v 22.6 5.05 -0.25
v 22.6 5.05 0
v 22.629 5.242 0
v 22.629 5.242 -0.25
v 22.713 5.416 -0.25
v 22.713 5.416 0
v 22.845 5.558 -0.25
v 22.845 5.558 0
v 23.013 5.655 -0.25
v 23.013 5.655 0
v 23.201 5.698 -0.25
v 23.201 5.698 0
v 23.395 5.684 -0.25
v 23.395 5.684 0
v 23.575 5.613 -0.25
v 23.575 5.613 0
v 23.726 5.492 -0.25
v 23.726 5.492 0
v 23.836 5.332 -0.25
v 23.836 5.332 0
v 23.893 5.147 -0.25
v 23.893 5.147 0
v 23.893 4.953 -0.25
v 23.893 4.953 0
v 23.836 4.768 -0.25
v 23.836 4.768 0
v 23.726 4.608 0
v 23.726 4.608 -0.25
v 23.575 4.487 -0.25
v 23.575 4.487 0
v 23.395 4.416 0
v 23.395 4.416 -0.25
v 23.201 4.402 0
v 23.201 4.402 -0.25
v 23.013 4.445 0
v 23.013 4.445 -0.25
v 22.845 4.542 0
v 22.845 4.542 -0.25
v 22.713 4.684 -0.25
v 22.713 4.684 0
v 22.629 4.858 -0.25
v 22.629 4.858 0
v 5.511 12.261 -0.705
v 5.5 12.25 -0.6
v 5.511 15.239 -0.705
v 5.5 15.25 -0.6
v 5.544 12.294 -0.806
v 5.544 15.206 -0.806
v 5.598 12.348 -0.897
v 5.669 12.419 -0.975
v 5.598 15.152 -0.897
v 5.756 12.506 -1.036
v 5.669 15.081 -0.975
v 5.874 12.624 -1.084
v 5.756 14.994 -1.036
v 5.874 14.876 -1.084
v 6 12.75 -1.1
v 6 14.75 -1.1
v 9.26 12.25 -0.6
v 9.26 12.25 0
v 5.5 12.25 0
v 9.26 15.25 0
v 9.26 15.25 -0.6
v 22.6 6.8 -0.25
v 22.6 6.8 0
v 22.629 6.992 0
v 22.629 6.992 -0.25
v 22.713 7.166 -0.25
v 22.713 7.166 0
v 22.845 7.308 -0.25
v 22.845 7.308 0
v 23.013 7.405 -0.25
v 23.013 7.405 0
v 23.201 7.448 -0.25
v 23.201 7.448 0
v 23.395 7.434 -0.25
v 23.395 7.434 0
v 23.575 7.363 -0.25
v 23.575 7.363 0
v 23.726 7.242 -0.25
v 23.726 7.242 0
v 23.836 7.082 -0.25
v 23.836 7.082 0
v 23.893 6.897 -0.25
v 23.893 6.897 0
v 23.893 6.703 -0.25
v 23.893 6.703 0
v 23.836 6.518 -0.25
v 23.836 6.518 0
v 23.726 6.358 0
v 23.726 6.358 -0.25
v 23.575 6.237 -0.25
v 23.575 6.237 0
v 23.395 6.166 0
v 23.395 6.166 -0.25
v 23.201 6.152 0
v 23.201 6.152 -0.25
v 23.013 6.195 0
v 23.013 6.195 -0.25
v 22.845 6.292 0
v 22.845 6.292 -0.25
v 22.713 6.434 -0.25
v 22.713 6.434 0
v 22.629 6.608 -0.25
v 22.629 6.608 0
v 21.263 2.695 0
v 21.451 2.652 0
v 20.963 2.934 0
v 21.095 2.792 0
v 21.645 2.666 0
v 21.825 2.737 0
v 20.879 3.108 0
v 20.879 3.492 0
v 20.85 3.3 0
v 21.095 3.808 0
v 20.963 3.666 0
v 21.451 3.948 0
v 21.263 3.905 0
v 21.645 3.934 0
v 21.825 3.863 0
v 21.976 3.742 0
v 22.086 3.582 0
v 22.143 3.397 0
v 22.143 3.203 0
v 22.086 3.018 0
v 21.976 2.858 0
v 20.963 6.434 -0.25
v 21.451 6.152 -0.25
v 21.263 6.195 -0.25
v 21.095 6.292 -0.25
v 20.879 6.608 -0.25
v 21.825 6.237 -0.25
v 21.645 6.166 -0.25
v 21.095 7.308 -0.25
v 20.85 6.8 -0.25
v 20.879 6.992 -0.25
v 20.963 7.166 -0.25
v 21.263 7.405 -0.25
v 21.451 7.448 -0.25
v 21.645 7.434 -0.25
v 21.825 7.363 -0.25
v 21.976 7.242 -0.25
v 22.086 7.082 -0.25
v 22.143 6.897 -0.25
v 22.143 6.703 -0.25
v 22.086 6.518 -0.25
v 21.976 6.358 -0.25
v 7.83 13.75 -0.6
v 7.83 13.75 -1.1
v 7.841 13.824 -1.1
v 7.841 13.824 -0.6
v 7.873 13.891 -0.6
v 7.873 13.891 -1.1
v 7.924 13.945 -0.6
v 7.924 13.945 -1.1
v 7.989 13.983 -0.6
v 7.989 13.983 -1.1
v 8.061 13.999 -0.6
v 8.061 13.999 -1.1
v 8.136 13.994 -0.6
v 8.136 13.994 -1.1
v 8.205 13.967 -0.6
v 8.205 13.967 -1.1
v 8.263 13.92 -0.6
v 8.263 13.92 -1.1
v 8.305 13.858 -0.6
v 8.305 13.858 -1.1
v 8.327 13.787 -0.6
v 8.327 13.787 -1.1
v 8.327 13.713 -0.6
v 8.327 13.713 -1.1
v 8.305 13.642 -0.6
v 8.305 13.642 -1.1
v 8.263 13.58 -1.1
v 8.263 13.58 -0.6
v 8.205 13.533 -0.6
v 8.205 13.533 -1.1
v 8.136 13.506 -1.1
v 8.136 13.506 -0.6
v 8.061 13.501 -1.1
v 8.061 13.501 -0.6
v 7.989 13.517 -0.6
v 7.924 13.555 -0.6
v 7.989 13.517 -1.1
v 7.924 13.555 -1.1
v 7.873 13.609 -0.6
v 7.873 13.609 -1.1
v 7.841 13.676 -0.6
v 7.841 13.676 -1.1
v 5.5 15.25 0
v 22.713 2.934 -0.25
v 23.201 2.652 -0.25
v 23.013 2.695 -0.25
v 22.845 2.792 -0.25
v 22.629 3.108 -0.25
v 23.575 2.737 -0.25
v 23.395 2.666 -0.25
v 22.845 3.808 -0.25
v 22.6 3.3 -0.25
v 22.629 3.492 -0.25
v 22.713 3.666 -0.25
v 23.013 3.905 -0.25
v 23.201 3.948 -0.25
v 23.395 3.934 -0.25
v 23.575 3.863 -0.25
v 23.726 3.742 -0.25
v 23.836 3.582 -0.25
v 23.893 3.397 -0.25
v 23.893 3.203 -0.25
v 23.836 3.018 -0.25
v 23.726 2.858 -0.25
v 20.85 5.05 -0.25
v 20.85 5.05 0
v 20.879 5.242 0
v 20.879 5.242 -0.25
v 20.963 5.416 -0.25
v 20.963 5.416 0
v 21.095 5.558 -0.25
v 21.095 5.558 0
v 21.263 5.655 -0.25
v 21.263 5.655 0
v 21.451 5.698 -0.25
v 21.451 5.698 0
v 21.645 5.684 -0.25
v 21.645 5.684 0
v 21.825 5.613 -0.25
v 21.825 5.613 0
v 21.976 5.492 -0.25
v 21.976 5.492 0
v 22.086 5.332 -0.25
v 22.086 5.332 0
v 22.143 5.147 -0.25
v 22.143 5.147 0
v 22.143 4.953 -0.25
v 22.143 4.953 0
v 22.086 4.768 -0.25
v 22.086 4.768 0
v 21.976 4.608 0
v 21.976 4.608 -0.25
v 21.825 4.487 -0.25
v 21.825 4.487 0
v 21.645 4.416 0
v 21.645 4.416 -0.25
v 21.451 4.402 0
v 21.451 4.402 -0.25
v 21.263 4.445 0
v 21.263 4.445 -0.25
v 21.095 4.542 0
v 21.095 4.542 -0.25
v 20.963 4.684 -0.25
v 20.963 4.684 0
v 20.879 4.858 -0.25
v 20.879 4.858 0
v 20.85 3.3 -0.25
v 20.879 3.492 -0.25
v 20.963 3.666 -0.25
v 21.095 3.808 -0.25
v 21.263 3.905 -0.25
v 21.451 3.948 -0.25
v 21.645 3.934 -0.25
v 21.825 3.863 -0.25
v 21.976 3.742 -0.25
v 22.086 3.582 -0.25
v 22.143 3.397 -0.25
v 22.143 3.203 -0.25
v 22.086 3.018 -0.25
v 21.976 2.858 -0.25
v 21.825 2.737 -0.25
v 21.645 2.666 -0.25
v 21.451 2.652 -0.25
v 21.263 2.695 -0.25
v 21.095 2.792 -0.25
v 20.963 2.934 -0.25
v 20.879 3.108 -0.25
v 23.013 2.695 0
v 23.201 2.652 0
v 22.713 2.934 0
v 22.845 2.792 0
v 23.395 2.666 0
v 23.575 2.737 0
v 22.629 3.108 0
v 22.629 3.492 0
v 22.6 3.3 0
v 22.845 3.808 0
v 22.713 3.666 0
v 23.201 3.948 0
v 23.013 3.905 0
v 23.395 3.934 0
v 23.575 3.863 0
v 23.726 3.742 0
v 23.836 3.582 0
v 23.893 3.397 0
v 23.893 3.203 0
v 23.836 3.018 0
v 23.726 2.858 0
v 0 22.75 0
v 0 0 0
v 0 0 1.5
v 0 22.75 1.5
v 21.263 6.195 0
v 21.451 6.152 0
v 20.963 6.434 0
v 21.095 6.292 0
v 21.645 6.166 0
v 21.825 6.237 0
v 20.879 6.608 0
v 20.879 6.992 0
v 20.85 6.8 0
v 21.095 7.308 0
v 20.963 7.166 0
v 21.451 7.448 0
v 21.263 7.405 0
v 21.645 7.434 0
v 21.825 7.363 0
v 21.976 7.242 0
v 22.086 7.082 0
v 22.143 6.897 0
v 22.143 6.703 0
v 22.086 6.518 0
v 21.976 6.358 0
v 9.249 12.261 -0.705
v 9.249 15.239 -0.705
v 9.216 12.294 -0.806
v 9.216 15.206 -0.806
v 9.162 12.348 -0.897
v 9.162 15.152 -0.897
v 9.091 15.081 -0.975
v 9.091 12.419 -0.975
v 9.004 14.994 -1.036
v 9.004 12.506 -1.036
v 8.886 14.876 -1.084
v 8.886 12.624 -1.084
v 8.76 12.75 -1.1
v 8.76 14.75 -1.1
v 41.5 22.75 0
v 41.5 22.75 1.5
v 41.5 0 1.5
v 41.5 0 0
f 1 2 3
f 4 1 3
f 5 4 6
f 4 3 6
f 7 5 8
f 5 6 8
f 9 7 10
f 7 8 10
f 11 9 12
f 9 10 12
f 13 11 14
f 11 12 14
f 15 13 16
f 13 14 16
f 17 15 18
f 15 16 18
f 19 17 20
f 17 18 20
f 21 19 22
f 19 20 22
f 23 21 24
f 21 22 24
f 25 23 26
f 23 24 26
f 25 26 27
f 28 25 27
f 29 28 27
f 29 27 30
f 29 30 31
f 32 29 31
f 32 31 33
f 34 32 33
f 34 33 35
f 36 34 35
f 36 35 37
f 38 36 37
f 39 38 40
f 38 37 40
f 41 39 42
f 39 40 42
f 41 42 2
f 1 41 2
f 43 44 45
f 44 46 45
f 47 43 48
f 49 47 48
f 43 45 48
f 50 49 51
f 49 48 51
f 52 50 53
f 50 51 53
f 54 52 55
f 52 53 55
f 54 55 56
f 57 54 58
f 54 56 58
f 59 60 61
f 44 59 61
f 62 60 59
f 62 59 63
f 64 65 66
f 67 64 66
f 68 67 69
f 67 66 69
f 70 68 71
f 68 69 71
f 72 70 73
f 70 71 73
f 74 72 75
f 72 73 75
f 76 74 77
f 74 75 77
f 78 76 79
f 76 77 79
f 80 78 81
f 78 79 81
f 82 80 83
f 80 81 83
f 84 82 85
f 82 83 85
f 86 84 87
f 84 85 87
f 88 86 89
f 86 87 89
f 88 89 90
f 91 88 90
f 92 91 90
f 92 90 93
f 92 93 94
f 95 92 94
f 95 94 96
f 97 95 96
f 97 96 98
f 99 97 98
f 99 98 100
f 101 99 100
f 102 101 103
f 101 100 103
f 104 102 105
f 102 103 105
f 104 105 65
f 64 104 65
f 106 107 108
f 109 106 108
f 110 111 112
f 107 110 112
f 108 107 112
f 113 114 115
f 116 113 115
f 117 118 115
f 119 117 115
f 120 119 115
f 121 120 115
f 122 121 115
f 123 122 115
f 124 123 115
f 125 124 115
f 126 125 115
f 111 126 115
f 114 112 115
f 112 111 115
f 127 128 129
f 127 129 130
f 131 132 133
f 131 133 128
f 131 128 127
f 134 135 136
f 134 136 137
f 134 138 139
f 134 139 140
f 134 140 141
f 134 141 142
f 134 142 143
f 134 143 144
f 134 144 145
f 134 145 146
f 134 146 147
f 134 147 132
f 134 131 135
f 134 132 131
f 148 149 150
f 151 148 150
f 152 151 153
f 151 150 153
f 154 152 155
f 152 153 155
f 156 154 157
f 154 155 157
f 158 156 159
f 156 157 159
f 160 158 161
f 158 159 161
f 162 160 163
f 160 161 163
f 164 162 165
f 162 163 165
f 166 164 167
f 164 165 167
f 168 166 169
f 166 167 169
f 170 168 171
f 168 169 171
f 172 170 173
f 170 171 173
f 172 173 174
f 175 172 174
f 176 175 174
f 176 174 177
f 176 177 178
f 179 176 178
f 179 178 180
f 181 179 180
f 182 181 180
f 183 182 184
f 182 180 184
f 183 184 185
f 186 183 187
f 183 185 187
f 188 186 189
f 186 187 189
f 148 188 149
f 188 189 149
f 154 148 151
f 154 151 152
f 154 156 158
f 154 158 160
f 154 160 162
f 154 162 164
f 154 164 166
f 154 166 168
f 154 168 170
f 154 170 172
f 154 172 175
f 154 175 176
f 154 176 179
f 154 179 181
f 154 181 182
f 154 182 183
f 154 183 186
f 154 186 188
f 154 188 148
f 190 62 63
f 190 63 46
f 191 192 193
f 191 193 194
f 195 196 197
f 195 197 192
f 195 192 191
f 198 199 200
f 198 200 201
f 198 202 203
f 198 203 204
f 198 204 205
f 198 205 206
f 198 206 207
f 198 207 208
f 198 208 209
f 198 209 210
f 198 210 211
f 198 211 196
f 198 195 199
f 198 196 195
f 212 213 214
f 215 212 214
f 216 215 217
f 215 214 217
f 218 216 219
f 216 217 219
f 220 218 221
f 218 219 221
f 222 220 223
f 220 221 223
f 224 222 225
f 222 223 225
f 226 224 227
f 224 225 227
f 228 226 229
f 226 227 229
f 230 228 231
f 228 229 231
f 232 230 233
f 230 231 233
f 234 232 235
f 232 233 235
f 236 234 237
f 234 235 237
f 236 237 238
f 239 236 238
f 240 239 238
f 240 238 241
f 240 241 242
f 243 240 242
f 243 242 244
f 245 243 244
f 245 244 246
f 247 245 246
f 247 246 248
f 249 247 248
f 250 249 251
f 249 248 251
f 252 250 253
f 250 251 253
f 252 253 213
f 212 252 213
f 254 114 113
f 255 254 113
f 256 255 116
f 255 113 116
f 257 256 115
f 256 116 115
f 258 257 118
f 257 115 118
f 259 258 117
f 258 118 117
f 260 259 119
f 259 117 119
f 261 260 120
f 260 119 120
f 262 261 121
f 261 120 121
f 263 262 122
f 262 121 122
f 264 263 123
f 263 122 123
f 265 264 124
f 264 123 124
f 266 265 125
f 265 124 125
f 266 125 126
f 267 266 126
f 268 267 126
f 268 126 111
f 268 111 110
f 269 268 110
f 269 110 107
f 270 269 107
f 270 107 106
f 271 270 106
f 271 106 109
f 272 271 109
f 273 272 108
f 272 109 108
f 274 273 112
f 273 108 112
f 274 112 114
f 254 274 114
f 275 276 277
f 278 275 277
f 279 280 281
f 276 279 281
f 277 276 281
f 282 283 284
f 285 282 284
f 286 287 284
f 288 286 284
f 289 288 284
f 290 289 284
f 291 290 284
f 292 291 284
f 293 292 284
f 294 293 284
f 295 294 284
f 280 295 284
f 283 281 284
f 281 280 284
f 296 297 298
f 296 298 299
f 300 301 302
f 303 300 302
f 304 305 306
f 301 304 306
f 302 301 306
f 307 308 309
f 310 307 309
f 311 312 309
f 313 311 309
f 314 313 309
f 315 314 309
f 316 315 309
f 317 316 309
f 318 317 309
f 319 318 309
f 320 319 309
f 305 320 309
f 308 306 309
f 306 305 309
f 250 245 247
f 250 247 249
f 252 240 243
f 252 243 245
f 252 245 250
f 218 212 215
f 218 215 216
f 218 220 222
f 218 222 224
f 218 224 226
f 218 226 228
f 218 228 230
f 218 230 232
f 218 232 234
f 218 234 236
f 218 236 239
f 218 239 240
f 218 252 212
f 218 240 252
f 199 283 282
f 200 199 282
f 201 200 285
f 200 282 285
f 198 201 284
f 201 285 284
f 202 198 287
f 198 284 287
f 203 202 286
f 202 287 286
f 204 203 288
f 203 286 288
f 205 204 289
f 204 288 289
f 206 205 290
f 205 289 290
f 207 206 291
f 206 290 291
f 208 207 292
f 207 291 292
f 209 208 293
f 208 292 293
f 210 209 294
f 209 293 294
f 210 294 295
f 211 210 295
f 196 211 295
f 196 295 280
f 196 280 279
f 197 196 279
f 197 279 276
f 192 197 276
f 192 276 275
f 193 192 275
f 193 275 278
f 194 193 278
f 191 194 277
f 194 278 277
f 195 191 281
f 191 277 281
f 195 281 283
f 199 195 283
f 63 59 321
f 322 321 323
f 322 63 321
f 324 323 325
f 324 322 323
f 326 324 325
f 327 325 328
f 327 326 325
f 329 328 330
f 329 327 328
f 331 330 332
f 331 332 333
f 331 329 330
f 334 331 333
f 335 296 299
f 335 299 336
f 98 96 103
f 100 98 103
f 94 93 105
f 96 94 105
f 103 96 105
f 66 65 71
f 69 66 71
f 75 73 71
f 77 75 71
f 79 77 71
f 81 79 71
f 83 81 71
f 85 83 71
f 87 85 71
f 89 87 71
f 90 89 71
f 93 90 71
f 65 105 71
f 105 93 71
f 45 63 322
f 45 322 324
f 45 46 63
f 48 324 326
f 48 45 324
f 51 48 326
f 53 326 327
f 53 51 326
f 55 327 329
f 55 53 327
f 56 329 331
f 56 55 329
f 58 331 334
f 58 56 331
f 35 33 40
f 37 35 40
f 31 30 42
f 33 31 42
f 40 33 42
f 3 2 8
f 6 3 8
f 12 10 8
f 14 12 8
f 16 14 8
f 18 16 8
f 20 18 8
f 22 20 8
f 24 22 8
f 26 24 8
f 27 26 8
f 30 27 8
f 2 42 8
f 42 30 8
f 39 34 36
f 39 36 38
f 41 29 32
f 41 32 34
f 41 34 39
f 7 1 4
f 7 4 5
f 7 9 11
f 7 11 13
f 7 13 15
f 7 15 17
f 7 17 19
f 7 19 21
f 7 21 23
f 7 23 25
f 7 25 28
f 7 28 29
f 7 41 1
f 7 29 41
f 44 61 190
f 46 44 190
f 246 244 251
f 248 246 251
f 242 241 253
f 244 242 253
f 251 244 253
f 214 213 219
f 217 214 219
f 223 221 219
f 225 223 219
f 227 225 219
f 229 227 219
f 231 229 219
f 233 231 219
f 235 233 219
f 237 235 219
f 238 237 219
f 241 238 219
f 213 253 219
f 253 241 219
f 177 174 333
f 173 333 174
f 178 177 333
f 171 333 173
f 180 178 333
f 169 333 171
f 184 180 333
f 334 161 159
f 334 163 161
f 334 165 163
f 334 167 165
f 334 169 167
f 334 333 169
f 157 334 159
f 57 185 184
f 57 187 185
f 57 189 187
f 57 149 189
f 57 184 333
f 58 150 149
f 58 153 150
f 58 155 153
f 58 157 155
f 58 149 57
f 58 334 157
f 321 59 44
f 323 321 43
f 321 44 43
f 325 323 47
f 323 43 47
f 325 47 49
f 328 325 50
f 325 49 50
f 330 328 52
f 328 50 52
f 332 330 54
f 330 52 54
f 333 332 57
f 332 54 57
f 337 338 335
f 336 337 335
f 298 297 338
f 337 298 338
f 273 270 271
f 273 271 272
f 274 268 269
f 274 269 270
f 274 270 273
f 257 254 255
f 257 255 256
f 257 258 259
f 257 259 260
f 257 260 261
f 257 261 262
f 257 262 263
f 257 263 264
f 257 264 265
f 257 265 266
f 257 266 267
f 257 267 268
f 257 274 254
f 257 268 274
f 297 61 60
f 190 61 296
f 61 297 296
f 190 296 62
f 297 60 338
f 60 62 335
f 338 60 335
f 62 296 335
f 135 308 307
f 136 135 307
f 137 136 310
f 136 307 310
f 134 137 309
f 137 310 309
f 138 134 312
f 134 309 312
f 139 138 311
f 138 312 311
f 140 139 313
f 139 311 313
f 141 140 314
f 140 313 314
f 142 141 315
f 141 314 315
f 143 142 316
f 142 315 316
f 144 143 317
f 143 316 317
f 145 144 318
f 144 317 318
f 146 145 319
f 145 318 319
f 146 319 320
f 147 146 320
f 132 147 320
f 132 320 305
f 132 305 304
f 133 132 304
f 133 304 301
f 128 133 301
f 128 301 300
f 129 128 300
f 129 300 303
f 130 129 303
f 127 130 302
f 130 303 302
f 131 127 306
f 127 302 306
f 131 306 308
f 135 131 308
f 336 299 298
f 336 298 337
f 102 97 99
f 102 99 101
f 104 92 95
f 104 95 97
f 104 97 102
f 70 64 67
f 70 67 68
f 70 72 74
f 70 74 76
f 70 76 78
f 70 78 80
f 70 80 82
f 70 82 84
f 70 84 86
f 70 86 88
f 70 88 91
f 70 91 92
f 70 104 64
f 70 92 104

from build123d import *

# Parameters (mm, degrees)
SKETCH1_W             = 41.5
SKETCH1_H             = 22.75
BOSS_EXTRUDE1_DEPTH   = 1.5
SKETCH2_W             = 3.76
SKETCH2_H             = 3
BOSS_EXTRUDE3_DEPTH   = 1.1
SKETCH3_R             = 0.25
CUT_EXTRUDE1_DEPTH    = 0.5
FILLET3_R             = 0.5
SKETCH4_R             = 0.65
BOSS_EXTRUDE6_DEPTH   = 0.25
BOSS_EXTRUDE6_2_DEPTH = 0.25
BOSS_EXTRUDE6_3_DEPTH = 0.25
BOSS_EXTRUDE6_4_DEPTH = 0.25
BOSS_EXTRUDE6_5_DEPTH = 0.25
BOSS_EXTRUDE6_6_DEPTH = 0.25


with BuildPart() as part:
    # Sketch1 → Boss-Extrude1 (new body)
    with BuildSketch(Plane.XY):
        with Locations((20.75, 11.375)):
            Rectangle(SKETCH1_W, SKETCH1_H)
    extrude(amount=BOSS_EXTRUDE1_DEPTH)

    # Sketch2 → Boss-Extrude3 (add)
    with BuildSketch(Plane(origin=(0, 0, 0), x_dir=(-1, 0, 0), z_dir=(0, 0, -1))):
        with Locations((-7.38, 13.75)):
            Rectangle(SKETCH2_W, SKETCH2_H)
    extrude(amount=BOSS_EXTRUDE3_DEPTH)

    # Sketch3 → Cut-Extrude1 (cut)
    with BuildSketch(Plane(origin=(0, 0, -1.1), x_dir=(-1, 0, 0), z_dir=(0, 0, -1))):
        with Locations((-8.08, 13.75)):
            Circle(SKETCH3_R)
    extrude(amount=-CUT_EXTRUDE1_DEPTH, mode=Mode.SUBTRACT)

    # Fillet3
    fillet3_edges = [part.edges().sort_by_distance(p)[0] for p in [
        (5.5, 13.75, -1.1),
        (7.38, 15.25, -1.1),
        (9.26, 13.75, -1.1),
        (7.38, 12.25, -1.1),
    ]]
    fillet(fillet3_edges, radius=FILLET3_R)


with BuildPart() as body_2:
    # Sketch4 → Boss-Extrude6 (new body)
    with BuildSketch(Plane(origin=(0, 0, 0), x_dir=(-1, 0, 0), z_dir=(0, 0, -1))):
        with Locations((-23.25, 3.3)):
            Circle(SKETCH4_R)
    extrude(amount=BOSS_EXTRUDE6_DEPTH)


with BuildPart() as body_3:
    # Sketch4 → Boss-Extrude6 2 (new body)
    with BuildSketch(Plane(origin=(0, 0, 0), x_dir=(-1, 0, 0), z_dir=(0, 0, -1))):
        with Locations((-23.25, 5.05)):
            Circle(SKETCH4_R)
    extrude(amount=BOSS_EXTRUDE6_2_DEPTH)


with BuildPart() as body_4:
    # Sketch4 → Boss-Extrude6 3 (new body)
    with BuildSketch(Plane(origin=(0, 0, 0), x_dir=(-1, 0, 0), z_dir=(0, 0, -1))):
        with Locations((-23.25, 6.8)):
            Circle(SKETCH4_R)
    extrude(amount=BOSS_EXTRUDE6_3_DEPTH)


with BuildPart() as body_5:
    # Sketch4 → Boss-Extrude6 4 (new body)
    with BuildSketch(Plane(origin=(0, 0, 0), x_dir=(-1, 0, 0), z_dir=(0, 0, -1))):
        with Locations((-21.5, 3.3)):
            Circle(SKETCH4_R)
    extrude(amount=BOSS_EXTRUDE6_4_DEPTH)


with BuildPart() as body_6:
    # Sketch4 → Boss-Extrude6 5 (new body)
    with BuildSketch(Plane(origin=(0, 0, 0), x_dir=(-1, 0, 0), z_dir=(0, 0, -1))):
        with Locations((-21.5, 5.05)):
            Circle(SKETCH4_R)
    extrude(amount=BOSS_EXTRUDE6_5_DEPTH)


with BuildPart() as body_7:
    # Sketch4 → Boss-Extrude6 6 (new body)
    with BuildSketch(Plane(origin=(0, 0, 0), x_dir=(-1, 0, 0), z_dir=(0, 0, -1))):
        with Locations((-21.5, 6.8)):
            Circle(SKETCH4_R)
    extrude(amount=BOSS_EXTRUDE6_6_DEPTH)


solid = Compound([part.part, body_2.part, body_3.part, body_4.part, body_5.part, body_6.part, body_7.part])
